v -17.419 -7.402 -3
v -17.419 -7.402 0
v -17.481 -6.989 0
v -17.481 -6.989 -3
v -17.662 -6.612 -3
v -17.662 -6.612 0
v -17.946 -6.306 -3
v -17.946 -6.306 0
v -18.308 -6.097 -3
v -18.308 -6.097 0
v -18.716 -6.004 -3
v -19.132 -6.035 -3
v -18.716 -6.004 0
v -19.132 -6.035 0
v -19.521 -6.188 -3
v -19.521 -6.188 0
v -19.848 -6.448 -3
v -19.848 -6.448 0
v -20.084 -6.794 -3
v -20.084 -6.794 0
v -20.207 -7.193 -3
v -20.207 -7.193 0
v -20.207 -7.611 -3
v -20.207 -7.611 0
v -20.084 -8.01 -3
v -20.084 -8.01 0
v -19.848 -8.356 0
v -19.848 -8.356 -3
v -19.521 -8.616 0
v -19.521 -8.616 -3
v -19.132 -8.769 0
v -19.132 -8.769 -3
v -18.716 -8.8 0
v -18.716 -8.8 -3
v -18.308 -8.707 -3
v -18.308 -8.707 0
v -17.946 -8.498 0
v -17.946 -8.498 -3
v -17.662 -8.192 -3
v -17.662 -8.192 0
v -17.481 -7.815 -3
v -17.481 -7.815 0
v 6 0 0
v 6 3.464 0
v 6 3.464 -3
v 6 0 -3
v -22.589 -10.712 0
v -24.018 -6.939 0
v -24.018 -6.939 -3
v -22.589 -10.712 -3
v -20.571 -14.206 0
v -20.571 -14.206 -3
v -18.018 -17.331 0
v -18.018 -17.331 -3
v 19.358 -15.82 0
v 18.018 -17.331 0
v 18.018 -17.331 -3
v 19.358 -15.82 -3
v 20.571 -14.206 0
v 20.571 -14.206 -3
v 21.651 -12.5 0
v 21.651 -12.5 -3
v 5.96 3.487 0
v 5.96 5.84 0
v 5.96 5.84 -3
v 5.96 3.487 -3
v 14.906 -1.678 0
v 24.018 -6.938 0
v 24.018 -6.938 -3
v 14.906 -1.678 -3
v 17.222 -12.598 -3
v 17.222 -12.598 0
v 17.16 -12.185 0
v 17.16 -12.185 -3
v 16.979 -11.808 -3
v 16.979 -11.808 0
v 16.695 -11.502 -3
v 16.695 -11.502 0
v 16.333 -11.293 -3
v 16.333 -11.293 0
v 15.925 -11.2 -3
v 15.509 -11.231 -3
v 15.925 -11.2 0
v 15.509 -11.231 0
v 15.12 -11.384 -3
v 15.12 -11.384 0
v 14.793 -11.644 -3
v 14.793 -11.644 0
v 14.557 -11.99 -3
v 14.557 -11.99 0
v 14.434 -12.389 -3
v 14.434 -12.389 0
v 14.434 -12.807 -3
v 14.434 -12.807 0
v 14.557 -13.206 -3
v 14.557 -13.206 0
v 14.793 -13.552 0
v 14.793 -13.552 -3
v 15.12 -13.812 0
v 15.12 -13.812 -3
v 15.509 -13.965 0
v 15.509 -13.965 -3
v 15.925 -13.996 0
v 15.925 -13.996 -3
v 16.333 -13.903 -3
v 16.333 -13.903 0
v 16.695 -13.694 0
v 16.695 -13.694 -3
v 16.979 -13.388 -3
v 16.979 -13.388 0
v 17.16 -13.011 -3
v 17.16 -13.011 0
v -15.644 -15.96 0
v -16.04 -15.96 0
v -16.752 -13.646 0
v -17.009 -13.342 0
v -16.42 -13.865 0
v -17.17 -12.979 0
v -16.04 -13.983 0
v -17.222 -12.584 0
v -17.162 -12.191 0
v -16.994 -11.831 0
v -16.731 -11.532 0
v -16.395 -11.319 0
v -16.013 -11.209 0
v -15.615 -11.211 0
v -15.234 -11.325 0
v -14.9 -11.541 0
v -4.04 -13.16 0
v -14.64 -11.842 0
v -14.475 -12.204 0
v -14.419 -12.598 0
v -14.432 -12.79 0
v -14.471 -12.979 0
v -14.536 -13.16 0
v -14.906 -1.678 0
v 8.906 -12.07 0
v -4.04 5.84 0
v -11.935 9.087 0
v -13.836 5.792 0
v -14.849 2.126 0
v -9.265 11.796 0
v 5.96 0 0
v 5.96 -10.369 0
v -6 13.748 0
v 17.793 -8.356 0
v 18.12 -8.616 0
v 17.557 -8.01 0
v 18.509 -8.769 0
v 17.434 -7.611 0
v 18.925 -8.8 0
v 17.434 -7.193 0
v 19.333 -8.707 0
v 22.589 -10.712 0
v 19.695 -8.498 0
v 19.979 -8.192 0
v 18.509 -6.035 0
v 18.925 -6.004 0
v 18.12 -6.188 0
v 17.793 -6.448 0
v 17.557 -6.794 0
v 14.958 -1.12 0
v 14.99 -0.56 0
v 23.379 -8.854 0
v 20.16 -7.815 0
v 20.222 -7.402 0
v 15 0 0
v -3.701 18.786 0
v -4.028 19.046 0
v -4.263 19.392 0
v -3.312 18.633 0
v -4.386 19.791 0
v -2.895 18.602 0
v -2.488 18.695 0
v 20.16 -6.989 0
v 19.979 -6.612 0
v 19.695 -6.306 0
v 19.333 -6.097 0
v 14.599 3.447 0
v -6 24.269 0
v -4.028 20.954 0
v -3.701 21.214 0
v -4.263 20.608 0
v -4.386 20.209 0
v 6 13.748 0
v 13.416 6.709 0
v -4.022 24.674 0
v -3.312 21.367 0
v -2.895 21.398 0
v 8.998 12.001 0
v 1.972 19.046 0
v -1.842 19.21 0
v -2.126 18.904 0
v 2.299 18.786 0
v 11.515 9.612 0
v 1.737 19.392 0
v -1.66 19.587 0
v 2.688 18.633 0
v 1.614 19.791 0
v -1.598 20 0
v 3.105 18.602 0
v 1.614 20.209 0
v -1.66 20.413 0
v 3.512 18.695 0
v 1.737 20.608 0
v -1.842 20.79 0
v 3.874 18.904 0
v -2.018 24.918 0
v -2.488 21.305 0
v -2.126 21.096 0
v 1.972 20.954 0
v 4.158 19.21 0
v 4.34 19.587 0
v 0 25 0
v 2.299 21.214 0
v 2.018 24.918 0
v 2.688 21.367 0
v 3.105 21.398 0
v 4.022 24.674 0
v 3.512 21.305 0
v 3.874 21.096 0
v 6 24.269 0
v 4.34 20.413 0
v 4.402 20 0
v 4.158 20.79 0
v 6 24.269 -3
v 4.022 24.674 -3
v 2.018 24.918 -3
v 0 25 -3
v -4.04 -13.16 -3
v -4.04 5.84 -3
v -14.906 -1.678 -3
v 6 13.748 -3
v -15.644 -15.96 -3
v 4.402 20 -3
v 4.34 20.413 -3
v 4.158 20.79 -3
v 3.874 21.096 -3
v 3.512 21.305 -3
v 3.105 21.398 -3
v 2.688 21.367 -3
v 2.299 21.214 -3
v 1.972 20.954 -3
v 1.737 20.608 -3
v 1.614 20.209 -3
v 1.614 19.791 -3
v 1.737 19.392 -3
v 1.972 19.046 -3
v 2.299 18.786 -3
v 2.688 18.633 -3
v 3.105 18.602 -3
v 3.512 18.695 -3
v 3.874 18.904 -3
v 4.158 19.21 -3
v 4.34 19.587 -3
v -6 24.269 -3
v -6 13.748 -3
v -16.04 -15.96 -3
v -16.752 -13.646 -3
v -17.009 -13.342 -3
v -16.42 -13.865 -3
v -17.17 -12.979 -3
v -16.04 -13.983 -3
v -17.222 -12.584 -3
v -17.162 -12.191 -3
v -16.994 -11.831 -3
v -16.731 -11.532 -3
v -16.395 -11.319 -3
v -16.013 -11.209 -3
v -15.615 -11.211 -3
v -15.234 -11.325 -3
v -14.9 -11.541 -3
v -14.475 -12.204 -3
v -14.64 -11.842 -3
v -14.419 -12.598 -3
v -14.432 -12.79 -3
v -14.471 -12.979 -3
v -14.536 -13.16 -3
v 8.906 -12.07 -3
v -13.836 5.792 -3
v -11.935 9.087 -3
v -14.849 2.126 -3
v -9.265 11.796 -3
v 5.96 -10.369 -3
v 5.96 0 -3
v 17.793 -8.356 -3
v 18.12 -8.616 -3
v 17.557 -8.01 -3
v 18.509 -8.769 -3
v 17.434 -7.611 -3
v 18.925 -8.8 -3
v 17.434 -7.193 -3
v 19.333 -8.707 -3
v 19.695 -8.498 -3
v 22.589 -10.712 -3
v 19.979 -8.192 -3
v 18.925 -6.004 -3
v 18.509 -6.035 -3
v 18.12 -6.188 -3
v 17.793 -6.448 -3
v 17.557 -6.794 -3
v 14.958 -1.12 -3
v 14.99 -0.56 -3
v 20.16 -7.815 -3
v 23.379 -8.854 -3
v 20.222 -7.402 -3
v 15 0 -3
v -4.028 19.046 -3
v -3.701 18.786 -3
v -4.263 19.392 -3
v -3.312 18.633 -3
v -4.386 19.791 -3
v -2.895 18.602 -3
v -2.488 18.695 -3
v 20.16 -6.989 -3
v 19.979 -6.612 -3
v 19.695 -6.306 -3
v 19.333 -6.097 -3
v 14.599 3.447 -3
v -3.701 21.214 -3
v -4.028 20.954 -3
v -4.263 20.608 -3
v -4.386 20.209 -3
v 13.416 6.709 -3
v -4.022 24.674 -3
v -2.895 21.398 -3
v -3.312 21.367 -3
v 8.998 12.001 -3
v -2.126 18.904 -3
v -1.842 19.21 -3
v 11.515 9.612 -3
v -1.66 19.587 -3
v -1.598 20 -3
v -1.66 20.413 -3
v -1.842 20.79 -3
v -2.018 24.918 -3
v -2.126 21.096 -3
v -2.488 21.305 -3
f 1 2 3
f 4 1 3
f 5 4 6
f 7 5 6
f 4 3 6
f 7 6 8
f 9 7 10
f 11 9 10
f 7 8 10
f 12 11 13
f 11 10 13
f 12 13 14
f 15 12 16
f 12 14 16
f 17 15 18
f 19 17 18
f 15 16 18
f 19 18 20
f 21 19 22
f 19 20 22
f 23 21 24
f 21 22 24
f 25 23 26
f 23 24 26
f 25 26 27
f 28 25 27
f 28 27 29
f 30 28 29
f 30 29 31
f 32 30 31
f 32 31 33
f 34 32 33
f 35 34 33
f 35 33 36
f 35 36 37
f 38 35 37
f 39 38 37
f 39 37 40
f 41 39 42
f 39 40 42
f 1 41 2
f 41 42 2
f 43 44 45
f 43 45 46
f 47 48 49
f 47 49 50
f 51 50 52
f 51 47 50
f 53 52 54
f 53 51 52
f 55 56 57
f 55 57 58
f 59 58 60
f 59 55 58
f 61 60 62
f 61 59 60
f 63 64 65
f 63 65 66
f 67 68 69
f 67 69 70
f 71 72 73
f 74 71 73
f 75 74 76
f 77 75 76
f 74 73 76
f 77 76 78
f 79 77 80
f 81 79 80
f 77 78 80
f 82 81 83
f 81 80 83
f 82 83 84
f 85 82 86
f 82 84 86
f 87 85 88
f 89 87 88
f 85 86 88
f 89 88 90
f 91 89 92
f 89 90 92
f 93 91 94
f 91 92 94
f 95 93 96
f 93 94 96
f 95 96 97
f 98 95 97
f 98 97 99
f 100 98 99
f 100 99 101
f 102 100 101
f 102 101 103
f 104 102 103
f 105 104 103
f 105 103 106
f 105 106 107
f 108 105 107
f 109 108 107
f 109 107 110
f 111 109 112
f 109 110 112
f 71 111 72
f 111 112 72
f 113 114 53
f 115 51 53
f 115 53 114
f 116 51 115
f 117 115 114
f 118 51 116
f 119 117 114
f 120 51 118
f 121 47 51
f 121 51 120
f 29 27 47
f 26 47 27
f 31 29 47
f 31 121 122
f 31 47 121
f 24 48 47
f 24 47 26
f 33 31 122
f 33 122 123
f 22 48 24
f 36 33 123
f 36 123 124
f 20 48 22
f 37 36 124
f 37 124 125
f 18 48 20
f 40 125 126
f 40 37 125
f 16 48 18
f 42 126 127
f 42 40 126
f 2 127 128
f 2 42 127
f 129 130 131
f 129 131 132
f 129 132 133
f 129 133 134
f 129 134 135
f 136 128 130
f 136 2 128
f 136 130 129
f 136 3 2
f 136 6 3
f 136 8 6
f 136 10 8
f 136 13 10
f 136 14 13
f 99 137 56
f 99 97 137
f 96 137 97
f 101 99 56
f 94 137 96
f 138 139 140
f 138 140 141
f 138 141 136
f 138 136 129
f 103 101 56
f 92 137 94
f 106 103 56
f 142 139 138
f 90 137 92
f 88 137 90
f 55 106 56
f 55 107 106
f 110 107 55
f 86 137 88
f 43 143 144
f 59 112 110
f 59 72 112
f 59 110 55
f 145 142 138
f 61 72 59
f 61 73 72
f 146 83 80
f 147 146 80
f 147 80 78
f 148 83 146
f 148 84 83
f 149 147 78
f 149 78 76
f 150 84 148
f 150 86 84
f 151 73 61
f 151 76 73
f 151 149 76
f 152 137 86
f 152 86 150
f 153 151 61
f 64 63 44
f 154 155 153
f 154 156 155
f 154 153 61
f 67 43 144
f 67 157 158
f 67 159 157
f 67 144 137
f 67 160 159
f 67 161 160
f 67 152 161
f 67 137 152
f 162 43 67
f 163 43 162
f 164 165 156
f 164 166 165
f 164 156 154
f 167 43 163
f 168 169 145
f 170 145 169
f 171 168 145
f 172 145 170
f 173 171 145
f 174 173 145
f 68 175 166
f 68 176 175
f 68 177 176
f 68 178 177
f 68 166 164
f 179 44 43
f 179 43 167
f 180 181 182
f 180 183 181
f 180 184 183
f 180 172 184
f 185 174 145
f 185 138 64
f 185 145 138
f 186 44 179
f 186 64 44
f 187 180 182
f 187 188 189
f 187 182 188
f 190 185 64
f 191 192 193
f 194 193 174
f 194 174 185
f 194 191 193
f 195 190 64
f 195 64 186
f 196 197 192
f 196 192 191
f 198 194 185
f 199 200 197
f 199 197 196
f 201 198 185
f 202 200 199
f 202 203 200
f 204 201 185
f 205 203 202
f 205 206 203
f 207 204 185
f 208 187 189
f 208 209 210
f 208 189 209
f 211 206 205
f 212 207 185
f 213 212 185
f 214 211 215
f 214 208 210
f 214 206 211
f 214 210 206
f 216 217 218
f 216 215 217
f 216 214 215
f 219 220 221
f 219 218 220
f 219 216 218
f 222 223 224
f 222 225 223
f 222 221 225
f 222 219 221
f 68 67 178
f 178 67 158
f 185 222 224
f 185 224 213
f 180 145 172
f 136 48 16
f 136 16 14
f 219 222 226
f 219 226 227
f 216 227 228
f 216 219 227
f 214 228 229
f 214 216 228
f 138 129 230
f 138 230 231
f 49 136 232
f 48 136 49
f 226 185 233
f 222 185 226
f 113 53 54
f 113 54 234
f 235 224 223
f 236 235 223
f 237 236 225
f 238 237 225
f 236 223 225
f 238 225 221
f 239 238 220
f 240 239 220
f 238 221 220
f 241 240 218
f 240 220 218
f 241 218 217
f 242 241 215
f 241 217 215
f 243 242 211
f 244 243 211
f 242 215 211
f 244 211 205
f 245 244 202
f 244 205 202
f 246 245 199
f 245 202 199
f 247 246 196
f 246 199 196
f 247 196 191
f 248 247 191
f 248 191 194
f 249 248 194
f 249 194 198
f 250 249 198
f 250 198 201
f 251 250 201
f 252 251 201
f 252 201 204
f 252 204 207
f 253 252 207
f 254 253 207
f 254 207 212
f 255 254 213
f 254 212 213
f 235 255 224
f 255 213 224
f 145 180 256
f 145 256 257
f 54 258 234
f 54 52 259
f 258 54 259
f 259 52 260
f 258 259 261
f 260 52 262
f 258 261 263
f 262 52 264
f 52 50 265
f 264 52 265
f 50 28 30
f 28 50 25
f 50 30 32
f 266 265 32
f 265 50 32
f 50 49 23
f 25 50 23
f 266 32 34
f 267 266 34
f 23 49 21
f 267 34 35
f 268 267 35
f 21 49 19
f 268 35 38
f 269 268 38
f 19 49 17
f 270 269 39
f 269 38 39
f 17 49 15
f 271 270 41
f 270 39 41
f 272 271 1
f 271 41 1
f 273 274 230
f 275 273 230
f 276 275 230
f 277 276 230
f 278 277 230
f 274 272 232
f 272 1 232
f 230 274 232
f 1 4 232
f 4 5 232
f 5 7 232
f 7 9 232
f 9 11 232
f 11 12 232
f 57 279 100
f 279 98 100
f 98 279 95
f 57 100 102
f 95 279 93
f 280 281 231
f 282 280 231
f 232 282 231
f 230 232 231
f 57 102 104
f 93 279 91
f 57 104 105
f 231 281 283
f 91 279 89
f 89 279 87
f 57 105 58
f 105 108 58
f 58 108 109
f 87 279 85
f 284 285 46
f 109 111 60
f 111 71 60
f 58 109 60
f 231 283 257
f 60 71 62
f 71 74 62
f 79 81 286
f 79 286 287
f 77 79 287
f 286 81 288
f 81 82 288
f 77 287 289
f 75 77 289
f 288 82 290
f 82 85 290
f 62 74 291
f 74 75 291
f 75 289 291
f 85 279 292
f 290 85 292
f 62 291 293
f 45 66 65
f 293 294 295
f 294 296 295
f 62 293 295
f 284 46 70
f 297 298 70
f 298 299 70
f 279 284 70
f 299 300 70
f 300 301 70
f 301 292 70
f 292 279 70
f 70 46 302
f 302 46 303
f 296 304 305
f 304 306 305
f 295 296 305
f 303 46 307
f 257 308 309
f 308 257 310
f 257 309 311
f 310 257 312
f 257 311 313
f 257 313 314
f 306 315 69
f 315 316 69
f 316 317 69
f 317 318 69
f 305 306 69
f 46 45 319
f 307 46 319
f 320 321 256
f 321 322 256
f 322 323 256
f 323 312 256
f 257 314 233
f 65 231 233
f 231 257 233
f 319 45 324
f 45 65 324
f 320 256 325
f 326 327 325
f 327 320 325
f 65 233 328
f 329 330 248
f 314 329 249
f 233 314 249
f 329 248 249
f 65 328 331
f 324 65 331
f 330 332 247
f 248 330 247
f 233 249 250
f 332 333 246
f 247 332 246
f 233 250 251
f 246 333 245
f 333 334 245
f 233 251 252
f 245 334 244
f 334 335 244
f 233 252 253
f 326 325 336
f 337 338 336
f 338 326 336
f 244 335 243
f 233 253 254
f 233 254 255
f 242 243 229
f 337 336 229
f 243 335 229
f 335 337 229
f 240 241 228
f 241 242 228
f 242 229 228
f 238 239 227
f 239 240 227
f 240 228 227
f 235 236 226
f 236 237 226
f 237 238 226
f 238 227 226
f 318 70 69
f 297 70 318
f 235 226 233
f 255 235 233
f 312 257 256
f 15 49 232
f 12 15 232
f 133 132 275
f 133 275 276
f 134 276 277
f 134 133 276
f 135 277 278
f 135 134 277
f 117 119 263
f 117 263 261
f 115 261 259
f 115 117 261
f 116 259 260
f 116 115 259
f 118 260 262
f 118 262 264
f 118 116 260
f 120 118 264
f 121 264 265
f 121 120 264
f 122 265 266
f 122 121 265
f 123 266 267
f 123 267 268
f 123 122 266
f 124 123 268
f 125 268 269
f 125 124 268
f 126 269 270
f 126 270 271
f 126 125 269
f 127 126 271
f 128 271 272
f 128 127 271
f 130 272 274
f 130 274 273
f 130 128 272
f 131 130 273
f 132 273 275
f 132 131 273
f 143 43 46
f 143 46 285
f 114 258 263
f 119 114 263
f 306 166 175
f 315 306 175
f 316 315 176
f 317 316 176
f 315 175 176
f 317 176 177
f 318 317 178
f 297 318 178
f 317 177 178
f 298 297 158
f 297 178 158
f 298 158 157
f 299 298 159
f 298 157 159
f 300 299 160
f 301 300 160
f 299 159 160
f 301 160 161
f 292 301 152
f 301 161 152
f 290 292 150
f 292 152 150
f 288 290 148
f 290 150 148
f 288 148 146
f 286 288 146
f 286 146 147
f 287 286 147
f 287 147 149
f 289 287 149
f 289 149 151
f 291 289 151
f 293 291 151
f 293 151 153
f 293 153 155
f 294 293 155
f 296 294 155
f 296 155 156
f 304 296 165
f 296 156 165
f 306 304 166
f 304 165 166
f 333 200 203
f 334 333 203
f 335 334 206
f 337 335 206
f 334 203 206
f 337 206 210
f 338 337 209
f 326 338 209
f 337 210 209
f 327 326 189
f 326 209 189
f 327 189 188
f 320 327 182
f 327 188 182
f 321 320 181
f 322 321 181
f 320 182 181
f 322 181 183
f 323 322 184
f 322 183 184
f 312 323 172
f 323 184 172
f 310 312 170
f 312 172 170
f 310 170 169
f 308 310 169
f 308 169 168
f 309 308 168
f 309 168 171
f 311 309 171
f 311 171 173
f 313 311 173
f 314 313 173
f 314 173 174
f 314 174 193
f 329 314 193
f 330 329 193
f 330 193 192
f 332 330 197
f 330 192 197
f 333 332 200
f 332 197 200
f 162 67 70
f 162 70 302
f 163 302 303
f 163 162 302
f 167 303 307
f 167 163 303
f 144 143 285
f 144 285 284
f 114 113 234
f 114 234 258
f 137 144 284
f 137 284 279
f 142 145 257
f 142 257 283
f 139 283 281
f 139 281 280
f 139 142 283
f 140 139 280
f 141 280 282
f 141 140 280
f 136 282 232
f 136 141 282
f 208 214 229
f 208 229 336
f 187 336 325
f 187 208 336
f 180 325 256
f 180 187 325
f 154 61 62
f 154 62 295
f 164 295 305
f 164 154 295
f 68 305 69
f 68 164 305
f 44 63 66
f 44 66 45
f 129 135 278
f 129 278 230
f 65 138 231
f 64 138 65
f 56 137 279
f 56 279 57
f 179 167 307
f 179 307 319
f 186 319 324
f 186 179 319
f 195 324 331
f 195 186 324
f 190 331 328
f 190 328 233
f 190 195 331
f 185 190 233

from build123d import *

# Parameters (mm, degrees)
F0_R     = 1.4019816861
F1_DEPTH = 3


with BuildPart() as f1:
    # F0 (on Top) → F1 (new body)
    with BuildSketch(Plane.XY):
        with BuildLine():
            Line((-18.017849557, -17.3308135222), (-24.017849557, -6.9385086768))
            ThreePointArc((-24.017849557, -6.9385086768), (-21.6506350946, -12.5), (-18.017849557, -17.3308135222))
        make_face()
        with BuildLine():
            Line((0, 25), (0, 24.269322199))
            Line((0, 24.269322199), (6, 24.269322199))
            ThreePointArc((6, 24.269322199), (3.0221635482, 24.8166582659), (0, 25))
        make_face()
        with BuildLine():
            Line((-6, 24.269322199), (0, 24.269322199))
            Line((0, 24.269322199), (0, 25))
            ThreePointArc((0, 25), (-3.0221635482, 24.8166582659), (-6, 24.269322199))
        make_face()
        with BuildLine():
            Line((0, 15), (0, 5.84))
            Line((0, 5.84), (5.96, 5.84))
            Line((5.96, 5.84), (5.96, 3.4871956259))
            Line((5.96, 3.4871956259), (6, 3.4641016151))
            Line((6, 3.4641016151), (6, 13.7477270849))
            ThreePointArc((6, 13.7477270849), (3.0646446553, 14.683594694), (0, 15))
        make_face()
        with BuildLine():
            Line((-4.04, 5.84), (0, 5.84))
            Line((0, 5.84), (0, 15))
            ThreePointArc((0, 15), (-3.0646446553, 14.683594694), (-6, 13.7477270849))
            Line((-6, 13.7477270849), (-6, 3.4641016151))
            Line((-6, 3.4641016151), (-14.9058808998, -1.6777111197))
            ThreePointArc((-14.9058808998, -1.6777111197), (-12.9903810568, -7.5), (-8.9058808998, -12.0700159651))
            Line((-8.9058808998, -12.0700159651), (-4.04, -9.2606983178))
            Line((-4.04, -9.2606983178), (-4.04, 0))
            Line((-4.04, 0), (-4.04, 4.5957081427))
            Line((-4.04, 4.5957081427), (-4.04, 5.84))
        make_face()
        with BuildLine():
            ThreePointArc((-6, 13.7477270849), (-3.0646446553, 14.683594694), (0, 15))
            Line((0, 15), (0, 24.269322199))
            Line((0, 24.269322199), (-6, 24.269322199))
            Line((-6, 24.269322199), (-6, 13.7477270849))
        make_face()
        with Locations((-3, 20)):
            Circle(F0_R, mode=Mode.SUBTRACT)
        with BuildLine():
            ThreePointArc((14.9058808998, -1.6777111197), (12.9903810568, -7.5), (8.9058808998, -12.0700159651))
            Line((8.9058808998, -12.0700159651), (18.0175705244, -17.3306524227))
            Line((18.0175705244, -17.3306524227), (24.0175705244, -6.9383475773))
            Line((24.0175705244, -6.9383475773), (14.9058808998, -1.6777111197))
        make_face()
        with Locations((15.8205080757, -12.5980762114)):
            Circle(F0_R, mode=Mode.SUBTRACT)
        with Locations((18.8205080757, -7.4019237886)):
            Circle(F0_R, mode=Mode.SUBTRACT)
        with BuildLine():
            Line((-10.7937886276, -13.16), (-8.9058808998, -12.0700159651))
            ThreePointArc((-8.9058808998, -12.0700159651), (-12.9903810568, -7.5), (-14.9058808998, -1.6777111197))
            Line((-14.9058808998, -1.6777111197), (-24.017849557, -6.9385086768))
            Line((-24.017849557, -6.9385086768), (-18.017849557, -17.3308135222))
            Line((-18.017849557, -17.3308135222), (-15.6435308888, -15.96))
            Line((-15.6435308888, -15.96), (-16.04, -15.96))
            Line((-16.04, -15.96), (-16.04, -13.9827696588))
            ThreePointArc((-16.04, -13.9827696588), (-16.7309554904, -11.5319438776), (-14.4185263896, -12.5980762114))
            ThreePointArc((-14.4185263896, -12.5980762114), (-14.4482255838, -12.8851187355), (-14.5360648874, -13.16))
            Line((-14.5360648874, -13.16), (-10.7937886276, -13.16))
        make_face()
        with Locations((-18.8205080757, -7.4019237886)):
            Circle(F0_R, mode=Mode.SUBTRACT)
        with BuildLine():
            Line((0, 24.269322199), (0, 15))
            ThreePointArc((0, 15), (3.0646446553, 14.683594694), (6, 13.7477270849))
            Line((6, 13.7477270849), (6, 24.269322199))
            Line((6, 24.269322199), (0, 24.269322199))
        make_face()
        with Locations((3, 20)):
            Circle(F0_R, mode=Mode.SUBTRACT)
        with BuildLine():
            Line((6, 0), (5.96, 0))
            Line((5.96, 0), (5.96, -10.3692108346))
            Line((5.96, -10.3692108346), (8.9058808998, -12.0700159651))
            ThreePointArc((8.9058808998, -12.0700159651), (12.9903810568, -7.5), (14.9058808998, -1.6777111197))
            Line((14.9058808998, -1.6777111197), (6, 3.4641016151))
            Line((6, 3.4641016151), (6, 0))
        make_face()
        with BuildLine():
            Line((6, 13.7477270849), (6, 3.4641016151))
            Line((6, 3.4641016151), (14.9058808998, -1.6777111197))
            ThreePointArc((14.9058808998, -1.6777111197), (14.9764517409, -0.8401745364), (15, 0))
            ThreePointArc((15, 0), (12.549900398, 8.2158383626), (6, 13.7477270849))
        make_face()
        with BuildLine():
            Line((-6, 3.4641016151), (-6, 13.7477270849))
            ThreePointArc((-6, 13.7477270849), (-12.9903810568, 7.5), (-14.9058808998, -1.6777111197))
            Line((-14.9058808998, -1.6777111197), (-6, 3.4641016151))
        make_face()
        with BuildLine():
            Line((24.0175705244, -6.9383475773), (18.0175705244, -17.3306524227))
            ThreePointArc((18.0175705244, -17.3306524227), (19.9806943206, -15.025575873), (21.6506348679, -12.5000003926))
            ThreePointArc((21.6506348679, -12.5000003926), (23.0028773953, -9.7910013475), (24.0175705244, -6.9383475773))
        make_face()
        with BuildLine():
            Line((-4.04, -11.16), (-4.04, -9.2606983178))
            Line((-4.04, -9.2606983178), (-8.9058808998, -12.0700159651))
            ThreePointArc((-8.9058808998, -12.0700159651), (-8.0704738939, -12.6438701009), (-7.1982220027, -13.16))
            Line((-7.1982220027, -13.16), (-4.04, -13.16))
            Line((-4.04, -13.16), (-4.04, -11.16))
        make_face()
        with BuildLine():
            ThreePointArc((-7.1982220027, -13.16), (-8.0704738939, -12.6438701009), (-8.9058808998, -12.0700159651))
            Line((-8.9058808998, -12.0700159651), (-10.7937886276, -13.16))
            Line((-10.7937886276, -13.16), (-7.1982220027, -13.16))
        make_face()
    extrude(amount=-F1_DEPTH)


solid = f1.part
